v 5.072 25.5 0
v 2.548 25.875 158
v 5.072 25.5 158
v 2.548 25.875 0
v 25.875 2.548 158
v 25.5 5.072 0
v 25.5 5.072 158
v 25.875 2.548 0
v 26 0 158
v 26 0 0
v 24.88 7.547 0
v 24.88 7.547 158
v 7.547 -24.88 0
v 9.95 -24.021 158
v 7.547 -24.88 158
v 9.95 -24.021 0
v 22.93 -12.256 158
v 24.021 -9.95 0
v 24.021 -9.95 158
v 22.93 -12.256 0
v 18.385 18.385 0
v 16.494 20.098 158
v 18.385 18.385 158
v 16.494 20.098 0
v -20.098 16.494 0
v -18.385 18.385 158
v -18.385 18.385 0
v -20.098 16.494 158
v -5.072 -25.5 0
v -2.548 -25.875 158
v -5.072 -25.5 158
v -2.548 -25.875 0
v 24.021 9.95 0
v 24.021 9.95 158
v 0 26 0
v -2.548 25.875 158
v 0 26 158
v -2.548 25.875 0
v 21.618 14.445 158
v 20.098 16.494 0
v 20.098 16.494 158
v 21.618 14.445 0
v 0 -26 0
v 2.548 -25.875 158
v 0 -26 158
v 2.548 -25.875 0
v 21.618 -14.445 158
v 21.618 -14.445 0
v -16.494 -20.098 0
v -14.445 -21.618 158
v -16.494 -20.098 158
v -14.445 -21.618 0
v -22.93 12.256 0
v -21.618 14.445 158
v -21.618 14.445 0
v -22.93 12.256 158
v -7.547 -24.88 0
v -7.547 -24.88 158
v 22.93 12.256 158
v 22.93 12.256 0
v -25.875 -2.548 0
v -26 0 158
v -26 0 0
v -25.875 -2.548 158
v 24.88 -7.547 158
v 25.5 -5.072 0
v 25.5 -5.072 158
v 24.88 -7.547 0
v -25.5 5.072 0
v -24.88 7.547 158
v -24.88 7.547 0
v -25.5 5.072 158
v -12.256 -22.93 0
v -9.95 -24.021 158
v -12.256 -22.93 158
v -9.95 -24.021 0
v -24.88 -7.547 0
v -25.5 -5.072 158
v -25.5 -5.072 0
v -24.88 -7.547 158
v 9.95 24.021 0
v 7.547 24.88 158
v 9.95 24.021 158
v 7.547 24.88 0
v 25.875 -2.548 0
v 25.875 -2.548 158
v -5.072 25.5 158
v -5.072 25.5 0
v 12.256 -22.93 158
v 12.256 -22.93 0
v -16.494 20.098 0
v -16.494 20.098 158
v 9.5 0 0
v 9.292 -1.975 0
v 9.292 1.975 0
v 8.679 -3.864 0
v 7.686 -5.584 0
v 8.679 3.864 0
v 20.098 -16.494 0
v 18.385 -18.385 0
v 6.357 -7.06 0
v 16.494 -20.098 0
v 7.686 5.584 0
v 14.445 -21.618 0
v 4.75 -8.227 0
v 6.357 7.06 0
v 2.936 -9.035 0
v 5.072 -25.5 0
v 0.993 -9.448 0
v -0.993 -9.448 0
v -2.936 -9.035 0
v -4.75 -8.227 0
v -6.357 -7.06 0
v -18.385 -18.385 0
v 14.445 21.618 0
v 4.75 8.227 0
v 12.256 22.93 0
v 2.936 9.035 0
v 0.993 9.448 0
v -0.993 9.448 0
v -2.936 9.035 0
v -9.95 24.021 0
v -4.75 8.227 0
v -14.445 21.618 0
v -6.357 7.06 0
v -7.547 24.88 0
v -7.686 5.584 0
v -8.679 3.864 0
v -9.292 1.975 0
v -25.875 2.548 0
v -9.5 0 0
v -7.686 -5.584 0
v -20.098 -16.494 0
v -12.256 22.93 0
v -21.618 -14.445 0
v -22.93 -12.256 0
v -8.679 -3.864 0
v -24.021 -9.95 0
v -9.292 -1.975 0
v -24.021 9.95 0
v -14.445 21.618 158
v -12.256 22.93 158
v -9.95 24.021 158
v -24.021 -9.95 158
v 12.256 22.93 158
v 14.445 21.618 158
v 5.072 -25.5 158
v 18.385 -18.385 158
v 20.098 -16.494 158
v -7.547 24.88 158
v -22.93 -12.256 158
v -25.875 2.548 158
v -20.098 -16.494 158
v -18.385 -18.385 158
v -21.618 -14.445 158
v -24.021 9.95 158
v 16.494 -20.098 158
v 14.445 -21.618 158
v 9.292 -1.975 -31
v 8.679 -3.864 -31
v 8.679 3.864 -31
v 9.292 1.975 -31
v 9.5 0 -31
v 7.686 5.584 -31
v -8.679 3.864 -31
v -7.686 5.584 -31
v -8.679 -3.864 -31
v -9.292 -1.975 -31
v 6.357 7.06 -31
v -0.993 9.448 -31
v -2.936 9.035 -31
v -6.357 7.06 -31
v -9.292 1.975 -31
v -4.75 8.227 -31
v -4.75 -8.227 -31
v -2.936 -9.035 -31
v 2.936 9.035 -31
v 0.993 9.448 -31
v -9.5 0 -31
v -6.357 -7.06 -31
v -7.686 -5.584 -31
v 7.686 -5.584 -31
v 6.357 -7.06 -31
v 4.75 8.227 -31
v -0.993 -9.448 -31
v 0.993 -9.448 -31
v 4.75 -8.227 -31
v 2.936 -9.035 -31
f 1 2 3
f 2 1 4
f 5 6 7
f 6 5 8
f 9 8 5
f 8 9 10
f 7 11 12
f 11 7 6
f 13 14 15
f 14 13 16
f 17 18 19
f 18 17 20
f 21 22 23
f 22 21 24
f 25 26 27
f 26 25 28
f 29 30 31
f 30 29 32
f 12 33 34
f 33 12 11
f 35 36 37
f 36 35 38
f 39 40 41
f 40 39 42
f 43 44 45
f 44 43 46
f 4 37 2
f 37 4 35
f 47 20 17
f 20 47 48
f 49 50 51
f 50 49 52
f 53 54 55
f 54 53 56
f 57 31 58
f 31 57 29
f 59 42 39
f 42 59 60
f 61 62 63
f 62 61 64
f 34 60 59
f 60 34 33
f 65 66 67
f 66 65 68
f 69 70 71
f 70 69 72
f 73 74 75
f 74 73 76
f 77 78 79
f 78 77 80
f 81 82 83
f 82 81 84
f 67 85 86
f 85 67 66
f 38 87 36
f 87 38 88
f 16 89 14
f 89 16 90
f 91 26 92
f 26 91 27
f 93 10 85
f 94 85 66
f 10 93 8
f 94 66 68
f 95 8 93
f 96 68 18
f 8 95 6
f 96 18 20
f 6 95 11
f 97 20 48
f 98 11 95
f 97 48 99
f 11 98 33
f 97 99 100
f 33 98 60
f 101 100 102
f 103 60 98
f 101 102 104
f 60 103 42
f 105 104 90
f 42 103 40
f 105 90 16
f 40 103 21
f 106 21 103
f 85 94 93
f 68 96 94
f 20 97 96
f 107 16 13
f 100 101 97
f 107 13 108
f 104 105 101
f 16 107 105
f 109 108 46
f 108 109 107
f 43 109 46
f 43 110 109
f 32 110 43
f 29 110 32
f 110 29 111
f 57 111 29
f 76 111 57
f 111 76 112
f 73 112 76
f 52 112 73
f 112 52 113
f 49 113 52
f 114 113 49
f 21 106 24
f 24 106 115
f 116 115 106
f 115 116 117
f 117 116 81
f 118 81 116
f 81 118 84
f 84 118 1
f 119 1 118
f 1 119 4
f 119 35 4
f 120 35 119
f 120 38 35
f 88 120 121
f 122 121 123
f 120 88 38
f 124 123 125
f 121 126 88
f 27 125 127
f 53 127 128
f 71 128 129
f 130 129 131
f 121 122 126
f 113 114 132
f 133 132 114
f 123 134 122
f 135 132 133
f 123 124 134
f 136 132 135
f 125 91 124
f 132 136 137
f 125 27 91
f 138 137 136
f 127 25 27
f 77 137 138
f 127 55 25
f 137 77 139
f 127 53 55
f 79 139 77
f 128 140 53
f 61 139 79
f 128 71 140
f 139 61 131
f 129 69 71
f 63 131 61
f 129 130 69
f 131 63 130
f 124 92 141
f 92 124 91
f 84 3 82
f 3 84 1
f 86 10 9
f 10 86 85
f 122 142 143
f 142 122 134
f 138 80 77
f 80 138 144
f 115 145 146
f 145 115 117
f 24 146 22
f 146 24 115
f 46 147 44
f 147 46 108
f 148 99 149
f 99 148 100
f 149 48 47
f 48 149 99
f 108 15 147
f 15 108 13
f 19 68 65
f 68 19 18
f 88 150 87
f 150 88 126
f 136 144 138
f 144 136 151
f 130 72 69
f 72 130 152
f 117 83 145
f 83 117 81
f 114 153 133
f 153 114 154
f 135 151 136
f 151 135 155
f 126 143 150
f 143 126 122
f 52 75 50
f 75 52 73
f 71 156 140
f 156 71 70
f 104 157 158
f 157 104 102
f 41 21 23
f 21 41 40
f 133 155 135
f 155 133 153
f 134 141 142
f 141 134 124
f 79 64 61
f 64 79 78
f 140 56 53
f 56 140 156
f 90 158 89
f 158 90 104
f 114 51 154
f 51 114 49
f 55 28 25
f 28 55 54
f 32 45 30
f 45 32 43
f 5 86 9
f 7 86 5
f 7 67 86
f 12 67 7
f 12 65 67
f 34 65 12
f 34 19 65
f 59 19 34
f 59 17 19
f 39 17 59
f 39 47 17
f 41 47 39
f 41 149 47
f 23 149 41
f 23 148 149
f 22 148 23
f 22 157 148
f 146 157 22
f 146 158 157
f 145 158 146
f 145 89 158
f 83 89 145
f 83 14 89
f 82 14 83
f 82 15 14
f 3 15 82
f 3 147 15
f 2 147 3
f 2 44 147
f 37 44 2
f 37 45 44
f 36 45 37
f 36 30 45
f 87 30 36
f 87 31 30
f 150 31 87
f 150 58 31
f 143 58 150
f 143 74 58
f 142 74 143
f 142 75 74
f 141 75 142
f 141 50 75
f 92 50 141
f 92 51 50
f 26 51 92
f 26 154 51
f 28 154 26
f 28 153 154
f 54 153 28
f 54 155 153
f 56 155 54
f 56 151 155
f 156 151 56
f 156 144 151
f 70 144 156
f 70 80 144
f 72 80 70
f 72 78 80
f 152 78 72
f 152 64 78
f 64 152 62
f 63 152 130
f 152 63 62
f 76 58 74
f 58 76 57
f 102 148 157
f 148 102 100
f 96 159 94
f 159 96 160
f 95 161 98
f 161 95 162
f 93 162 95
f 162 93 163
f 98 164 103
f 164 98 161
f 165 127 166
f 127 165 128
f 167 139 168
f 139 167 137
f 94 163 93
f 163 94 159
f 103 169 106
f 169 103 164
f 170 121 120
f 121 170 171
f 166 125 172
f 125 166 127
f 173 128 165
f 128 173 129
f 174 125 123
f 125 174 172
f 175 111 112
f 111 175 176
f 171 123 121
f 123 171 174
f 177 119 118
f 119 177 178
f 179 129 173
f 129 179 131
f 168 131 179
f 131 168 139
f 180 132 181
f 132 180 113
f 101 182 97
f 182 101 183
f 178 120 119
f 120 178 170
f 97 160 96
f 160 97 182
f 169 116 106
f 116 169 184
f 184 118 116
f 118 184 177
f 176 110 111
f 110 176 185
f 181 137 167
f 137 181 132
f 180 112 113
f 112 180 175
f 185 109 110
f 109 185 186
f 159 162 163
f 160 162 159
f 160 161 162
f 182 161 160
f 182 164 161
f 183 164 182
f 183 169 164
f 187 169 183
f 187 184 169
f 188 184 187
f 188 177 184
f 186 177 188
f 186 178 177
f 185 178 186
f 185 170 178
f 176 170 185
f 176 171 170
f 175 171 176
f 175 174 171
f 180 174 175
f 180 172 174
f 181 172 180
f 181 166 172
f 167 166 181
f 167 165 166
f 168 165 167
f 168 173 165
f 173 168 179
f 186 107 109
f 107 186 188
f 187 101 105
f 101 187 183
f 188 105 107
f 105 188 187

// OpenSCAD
module spindle_motor(){
    // body
    cylinder(d = 52, h= 158, $fn=64); /* h= 208 ???*/
    
    // 
    translate([0,0,-18 -13])
    cylinder(d= 19, h = 18 + 13);
}


spindle_motor();
